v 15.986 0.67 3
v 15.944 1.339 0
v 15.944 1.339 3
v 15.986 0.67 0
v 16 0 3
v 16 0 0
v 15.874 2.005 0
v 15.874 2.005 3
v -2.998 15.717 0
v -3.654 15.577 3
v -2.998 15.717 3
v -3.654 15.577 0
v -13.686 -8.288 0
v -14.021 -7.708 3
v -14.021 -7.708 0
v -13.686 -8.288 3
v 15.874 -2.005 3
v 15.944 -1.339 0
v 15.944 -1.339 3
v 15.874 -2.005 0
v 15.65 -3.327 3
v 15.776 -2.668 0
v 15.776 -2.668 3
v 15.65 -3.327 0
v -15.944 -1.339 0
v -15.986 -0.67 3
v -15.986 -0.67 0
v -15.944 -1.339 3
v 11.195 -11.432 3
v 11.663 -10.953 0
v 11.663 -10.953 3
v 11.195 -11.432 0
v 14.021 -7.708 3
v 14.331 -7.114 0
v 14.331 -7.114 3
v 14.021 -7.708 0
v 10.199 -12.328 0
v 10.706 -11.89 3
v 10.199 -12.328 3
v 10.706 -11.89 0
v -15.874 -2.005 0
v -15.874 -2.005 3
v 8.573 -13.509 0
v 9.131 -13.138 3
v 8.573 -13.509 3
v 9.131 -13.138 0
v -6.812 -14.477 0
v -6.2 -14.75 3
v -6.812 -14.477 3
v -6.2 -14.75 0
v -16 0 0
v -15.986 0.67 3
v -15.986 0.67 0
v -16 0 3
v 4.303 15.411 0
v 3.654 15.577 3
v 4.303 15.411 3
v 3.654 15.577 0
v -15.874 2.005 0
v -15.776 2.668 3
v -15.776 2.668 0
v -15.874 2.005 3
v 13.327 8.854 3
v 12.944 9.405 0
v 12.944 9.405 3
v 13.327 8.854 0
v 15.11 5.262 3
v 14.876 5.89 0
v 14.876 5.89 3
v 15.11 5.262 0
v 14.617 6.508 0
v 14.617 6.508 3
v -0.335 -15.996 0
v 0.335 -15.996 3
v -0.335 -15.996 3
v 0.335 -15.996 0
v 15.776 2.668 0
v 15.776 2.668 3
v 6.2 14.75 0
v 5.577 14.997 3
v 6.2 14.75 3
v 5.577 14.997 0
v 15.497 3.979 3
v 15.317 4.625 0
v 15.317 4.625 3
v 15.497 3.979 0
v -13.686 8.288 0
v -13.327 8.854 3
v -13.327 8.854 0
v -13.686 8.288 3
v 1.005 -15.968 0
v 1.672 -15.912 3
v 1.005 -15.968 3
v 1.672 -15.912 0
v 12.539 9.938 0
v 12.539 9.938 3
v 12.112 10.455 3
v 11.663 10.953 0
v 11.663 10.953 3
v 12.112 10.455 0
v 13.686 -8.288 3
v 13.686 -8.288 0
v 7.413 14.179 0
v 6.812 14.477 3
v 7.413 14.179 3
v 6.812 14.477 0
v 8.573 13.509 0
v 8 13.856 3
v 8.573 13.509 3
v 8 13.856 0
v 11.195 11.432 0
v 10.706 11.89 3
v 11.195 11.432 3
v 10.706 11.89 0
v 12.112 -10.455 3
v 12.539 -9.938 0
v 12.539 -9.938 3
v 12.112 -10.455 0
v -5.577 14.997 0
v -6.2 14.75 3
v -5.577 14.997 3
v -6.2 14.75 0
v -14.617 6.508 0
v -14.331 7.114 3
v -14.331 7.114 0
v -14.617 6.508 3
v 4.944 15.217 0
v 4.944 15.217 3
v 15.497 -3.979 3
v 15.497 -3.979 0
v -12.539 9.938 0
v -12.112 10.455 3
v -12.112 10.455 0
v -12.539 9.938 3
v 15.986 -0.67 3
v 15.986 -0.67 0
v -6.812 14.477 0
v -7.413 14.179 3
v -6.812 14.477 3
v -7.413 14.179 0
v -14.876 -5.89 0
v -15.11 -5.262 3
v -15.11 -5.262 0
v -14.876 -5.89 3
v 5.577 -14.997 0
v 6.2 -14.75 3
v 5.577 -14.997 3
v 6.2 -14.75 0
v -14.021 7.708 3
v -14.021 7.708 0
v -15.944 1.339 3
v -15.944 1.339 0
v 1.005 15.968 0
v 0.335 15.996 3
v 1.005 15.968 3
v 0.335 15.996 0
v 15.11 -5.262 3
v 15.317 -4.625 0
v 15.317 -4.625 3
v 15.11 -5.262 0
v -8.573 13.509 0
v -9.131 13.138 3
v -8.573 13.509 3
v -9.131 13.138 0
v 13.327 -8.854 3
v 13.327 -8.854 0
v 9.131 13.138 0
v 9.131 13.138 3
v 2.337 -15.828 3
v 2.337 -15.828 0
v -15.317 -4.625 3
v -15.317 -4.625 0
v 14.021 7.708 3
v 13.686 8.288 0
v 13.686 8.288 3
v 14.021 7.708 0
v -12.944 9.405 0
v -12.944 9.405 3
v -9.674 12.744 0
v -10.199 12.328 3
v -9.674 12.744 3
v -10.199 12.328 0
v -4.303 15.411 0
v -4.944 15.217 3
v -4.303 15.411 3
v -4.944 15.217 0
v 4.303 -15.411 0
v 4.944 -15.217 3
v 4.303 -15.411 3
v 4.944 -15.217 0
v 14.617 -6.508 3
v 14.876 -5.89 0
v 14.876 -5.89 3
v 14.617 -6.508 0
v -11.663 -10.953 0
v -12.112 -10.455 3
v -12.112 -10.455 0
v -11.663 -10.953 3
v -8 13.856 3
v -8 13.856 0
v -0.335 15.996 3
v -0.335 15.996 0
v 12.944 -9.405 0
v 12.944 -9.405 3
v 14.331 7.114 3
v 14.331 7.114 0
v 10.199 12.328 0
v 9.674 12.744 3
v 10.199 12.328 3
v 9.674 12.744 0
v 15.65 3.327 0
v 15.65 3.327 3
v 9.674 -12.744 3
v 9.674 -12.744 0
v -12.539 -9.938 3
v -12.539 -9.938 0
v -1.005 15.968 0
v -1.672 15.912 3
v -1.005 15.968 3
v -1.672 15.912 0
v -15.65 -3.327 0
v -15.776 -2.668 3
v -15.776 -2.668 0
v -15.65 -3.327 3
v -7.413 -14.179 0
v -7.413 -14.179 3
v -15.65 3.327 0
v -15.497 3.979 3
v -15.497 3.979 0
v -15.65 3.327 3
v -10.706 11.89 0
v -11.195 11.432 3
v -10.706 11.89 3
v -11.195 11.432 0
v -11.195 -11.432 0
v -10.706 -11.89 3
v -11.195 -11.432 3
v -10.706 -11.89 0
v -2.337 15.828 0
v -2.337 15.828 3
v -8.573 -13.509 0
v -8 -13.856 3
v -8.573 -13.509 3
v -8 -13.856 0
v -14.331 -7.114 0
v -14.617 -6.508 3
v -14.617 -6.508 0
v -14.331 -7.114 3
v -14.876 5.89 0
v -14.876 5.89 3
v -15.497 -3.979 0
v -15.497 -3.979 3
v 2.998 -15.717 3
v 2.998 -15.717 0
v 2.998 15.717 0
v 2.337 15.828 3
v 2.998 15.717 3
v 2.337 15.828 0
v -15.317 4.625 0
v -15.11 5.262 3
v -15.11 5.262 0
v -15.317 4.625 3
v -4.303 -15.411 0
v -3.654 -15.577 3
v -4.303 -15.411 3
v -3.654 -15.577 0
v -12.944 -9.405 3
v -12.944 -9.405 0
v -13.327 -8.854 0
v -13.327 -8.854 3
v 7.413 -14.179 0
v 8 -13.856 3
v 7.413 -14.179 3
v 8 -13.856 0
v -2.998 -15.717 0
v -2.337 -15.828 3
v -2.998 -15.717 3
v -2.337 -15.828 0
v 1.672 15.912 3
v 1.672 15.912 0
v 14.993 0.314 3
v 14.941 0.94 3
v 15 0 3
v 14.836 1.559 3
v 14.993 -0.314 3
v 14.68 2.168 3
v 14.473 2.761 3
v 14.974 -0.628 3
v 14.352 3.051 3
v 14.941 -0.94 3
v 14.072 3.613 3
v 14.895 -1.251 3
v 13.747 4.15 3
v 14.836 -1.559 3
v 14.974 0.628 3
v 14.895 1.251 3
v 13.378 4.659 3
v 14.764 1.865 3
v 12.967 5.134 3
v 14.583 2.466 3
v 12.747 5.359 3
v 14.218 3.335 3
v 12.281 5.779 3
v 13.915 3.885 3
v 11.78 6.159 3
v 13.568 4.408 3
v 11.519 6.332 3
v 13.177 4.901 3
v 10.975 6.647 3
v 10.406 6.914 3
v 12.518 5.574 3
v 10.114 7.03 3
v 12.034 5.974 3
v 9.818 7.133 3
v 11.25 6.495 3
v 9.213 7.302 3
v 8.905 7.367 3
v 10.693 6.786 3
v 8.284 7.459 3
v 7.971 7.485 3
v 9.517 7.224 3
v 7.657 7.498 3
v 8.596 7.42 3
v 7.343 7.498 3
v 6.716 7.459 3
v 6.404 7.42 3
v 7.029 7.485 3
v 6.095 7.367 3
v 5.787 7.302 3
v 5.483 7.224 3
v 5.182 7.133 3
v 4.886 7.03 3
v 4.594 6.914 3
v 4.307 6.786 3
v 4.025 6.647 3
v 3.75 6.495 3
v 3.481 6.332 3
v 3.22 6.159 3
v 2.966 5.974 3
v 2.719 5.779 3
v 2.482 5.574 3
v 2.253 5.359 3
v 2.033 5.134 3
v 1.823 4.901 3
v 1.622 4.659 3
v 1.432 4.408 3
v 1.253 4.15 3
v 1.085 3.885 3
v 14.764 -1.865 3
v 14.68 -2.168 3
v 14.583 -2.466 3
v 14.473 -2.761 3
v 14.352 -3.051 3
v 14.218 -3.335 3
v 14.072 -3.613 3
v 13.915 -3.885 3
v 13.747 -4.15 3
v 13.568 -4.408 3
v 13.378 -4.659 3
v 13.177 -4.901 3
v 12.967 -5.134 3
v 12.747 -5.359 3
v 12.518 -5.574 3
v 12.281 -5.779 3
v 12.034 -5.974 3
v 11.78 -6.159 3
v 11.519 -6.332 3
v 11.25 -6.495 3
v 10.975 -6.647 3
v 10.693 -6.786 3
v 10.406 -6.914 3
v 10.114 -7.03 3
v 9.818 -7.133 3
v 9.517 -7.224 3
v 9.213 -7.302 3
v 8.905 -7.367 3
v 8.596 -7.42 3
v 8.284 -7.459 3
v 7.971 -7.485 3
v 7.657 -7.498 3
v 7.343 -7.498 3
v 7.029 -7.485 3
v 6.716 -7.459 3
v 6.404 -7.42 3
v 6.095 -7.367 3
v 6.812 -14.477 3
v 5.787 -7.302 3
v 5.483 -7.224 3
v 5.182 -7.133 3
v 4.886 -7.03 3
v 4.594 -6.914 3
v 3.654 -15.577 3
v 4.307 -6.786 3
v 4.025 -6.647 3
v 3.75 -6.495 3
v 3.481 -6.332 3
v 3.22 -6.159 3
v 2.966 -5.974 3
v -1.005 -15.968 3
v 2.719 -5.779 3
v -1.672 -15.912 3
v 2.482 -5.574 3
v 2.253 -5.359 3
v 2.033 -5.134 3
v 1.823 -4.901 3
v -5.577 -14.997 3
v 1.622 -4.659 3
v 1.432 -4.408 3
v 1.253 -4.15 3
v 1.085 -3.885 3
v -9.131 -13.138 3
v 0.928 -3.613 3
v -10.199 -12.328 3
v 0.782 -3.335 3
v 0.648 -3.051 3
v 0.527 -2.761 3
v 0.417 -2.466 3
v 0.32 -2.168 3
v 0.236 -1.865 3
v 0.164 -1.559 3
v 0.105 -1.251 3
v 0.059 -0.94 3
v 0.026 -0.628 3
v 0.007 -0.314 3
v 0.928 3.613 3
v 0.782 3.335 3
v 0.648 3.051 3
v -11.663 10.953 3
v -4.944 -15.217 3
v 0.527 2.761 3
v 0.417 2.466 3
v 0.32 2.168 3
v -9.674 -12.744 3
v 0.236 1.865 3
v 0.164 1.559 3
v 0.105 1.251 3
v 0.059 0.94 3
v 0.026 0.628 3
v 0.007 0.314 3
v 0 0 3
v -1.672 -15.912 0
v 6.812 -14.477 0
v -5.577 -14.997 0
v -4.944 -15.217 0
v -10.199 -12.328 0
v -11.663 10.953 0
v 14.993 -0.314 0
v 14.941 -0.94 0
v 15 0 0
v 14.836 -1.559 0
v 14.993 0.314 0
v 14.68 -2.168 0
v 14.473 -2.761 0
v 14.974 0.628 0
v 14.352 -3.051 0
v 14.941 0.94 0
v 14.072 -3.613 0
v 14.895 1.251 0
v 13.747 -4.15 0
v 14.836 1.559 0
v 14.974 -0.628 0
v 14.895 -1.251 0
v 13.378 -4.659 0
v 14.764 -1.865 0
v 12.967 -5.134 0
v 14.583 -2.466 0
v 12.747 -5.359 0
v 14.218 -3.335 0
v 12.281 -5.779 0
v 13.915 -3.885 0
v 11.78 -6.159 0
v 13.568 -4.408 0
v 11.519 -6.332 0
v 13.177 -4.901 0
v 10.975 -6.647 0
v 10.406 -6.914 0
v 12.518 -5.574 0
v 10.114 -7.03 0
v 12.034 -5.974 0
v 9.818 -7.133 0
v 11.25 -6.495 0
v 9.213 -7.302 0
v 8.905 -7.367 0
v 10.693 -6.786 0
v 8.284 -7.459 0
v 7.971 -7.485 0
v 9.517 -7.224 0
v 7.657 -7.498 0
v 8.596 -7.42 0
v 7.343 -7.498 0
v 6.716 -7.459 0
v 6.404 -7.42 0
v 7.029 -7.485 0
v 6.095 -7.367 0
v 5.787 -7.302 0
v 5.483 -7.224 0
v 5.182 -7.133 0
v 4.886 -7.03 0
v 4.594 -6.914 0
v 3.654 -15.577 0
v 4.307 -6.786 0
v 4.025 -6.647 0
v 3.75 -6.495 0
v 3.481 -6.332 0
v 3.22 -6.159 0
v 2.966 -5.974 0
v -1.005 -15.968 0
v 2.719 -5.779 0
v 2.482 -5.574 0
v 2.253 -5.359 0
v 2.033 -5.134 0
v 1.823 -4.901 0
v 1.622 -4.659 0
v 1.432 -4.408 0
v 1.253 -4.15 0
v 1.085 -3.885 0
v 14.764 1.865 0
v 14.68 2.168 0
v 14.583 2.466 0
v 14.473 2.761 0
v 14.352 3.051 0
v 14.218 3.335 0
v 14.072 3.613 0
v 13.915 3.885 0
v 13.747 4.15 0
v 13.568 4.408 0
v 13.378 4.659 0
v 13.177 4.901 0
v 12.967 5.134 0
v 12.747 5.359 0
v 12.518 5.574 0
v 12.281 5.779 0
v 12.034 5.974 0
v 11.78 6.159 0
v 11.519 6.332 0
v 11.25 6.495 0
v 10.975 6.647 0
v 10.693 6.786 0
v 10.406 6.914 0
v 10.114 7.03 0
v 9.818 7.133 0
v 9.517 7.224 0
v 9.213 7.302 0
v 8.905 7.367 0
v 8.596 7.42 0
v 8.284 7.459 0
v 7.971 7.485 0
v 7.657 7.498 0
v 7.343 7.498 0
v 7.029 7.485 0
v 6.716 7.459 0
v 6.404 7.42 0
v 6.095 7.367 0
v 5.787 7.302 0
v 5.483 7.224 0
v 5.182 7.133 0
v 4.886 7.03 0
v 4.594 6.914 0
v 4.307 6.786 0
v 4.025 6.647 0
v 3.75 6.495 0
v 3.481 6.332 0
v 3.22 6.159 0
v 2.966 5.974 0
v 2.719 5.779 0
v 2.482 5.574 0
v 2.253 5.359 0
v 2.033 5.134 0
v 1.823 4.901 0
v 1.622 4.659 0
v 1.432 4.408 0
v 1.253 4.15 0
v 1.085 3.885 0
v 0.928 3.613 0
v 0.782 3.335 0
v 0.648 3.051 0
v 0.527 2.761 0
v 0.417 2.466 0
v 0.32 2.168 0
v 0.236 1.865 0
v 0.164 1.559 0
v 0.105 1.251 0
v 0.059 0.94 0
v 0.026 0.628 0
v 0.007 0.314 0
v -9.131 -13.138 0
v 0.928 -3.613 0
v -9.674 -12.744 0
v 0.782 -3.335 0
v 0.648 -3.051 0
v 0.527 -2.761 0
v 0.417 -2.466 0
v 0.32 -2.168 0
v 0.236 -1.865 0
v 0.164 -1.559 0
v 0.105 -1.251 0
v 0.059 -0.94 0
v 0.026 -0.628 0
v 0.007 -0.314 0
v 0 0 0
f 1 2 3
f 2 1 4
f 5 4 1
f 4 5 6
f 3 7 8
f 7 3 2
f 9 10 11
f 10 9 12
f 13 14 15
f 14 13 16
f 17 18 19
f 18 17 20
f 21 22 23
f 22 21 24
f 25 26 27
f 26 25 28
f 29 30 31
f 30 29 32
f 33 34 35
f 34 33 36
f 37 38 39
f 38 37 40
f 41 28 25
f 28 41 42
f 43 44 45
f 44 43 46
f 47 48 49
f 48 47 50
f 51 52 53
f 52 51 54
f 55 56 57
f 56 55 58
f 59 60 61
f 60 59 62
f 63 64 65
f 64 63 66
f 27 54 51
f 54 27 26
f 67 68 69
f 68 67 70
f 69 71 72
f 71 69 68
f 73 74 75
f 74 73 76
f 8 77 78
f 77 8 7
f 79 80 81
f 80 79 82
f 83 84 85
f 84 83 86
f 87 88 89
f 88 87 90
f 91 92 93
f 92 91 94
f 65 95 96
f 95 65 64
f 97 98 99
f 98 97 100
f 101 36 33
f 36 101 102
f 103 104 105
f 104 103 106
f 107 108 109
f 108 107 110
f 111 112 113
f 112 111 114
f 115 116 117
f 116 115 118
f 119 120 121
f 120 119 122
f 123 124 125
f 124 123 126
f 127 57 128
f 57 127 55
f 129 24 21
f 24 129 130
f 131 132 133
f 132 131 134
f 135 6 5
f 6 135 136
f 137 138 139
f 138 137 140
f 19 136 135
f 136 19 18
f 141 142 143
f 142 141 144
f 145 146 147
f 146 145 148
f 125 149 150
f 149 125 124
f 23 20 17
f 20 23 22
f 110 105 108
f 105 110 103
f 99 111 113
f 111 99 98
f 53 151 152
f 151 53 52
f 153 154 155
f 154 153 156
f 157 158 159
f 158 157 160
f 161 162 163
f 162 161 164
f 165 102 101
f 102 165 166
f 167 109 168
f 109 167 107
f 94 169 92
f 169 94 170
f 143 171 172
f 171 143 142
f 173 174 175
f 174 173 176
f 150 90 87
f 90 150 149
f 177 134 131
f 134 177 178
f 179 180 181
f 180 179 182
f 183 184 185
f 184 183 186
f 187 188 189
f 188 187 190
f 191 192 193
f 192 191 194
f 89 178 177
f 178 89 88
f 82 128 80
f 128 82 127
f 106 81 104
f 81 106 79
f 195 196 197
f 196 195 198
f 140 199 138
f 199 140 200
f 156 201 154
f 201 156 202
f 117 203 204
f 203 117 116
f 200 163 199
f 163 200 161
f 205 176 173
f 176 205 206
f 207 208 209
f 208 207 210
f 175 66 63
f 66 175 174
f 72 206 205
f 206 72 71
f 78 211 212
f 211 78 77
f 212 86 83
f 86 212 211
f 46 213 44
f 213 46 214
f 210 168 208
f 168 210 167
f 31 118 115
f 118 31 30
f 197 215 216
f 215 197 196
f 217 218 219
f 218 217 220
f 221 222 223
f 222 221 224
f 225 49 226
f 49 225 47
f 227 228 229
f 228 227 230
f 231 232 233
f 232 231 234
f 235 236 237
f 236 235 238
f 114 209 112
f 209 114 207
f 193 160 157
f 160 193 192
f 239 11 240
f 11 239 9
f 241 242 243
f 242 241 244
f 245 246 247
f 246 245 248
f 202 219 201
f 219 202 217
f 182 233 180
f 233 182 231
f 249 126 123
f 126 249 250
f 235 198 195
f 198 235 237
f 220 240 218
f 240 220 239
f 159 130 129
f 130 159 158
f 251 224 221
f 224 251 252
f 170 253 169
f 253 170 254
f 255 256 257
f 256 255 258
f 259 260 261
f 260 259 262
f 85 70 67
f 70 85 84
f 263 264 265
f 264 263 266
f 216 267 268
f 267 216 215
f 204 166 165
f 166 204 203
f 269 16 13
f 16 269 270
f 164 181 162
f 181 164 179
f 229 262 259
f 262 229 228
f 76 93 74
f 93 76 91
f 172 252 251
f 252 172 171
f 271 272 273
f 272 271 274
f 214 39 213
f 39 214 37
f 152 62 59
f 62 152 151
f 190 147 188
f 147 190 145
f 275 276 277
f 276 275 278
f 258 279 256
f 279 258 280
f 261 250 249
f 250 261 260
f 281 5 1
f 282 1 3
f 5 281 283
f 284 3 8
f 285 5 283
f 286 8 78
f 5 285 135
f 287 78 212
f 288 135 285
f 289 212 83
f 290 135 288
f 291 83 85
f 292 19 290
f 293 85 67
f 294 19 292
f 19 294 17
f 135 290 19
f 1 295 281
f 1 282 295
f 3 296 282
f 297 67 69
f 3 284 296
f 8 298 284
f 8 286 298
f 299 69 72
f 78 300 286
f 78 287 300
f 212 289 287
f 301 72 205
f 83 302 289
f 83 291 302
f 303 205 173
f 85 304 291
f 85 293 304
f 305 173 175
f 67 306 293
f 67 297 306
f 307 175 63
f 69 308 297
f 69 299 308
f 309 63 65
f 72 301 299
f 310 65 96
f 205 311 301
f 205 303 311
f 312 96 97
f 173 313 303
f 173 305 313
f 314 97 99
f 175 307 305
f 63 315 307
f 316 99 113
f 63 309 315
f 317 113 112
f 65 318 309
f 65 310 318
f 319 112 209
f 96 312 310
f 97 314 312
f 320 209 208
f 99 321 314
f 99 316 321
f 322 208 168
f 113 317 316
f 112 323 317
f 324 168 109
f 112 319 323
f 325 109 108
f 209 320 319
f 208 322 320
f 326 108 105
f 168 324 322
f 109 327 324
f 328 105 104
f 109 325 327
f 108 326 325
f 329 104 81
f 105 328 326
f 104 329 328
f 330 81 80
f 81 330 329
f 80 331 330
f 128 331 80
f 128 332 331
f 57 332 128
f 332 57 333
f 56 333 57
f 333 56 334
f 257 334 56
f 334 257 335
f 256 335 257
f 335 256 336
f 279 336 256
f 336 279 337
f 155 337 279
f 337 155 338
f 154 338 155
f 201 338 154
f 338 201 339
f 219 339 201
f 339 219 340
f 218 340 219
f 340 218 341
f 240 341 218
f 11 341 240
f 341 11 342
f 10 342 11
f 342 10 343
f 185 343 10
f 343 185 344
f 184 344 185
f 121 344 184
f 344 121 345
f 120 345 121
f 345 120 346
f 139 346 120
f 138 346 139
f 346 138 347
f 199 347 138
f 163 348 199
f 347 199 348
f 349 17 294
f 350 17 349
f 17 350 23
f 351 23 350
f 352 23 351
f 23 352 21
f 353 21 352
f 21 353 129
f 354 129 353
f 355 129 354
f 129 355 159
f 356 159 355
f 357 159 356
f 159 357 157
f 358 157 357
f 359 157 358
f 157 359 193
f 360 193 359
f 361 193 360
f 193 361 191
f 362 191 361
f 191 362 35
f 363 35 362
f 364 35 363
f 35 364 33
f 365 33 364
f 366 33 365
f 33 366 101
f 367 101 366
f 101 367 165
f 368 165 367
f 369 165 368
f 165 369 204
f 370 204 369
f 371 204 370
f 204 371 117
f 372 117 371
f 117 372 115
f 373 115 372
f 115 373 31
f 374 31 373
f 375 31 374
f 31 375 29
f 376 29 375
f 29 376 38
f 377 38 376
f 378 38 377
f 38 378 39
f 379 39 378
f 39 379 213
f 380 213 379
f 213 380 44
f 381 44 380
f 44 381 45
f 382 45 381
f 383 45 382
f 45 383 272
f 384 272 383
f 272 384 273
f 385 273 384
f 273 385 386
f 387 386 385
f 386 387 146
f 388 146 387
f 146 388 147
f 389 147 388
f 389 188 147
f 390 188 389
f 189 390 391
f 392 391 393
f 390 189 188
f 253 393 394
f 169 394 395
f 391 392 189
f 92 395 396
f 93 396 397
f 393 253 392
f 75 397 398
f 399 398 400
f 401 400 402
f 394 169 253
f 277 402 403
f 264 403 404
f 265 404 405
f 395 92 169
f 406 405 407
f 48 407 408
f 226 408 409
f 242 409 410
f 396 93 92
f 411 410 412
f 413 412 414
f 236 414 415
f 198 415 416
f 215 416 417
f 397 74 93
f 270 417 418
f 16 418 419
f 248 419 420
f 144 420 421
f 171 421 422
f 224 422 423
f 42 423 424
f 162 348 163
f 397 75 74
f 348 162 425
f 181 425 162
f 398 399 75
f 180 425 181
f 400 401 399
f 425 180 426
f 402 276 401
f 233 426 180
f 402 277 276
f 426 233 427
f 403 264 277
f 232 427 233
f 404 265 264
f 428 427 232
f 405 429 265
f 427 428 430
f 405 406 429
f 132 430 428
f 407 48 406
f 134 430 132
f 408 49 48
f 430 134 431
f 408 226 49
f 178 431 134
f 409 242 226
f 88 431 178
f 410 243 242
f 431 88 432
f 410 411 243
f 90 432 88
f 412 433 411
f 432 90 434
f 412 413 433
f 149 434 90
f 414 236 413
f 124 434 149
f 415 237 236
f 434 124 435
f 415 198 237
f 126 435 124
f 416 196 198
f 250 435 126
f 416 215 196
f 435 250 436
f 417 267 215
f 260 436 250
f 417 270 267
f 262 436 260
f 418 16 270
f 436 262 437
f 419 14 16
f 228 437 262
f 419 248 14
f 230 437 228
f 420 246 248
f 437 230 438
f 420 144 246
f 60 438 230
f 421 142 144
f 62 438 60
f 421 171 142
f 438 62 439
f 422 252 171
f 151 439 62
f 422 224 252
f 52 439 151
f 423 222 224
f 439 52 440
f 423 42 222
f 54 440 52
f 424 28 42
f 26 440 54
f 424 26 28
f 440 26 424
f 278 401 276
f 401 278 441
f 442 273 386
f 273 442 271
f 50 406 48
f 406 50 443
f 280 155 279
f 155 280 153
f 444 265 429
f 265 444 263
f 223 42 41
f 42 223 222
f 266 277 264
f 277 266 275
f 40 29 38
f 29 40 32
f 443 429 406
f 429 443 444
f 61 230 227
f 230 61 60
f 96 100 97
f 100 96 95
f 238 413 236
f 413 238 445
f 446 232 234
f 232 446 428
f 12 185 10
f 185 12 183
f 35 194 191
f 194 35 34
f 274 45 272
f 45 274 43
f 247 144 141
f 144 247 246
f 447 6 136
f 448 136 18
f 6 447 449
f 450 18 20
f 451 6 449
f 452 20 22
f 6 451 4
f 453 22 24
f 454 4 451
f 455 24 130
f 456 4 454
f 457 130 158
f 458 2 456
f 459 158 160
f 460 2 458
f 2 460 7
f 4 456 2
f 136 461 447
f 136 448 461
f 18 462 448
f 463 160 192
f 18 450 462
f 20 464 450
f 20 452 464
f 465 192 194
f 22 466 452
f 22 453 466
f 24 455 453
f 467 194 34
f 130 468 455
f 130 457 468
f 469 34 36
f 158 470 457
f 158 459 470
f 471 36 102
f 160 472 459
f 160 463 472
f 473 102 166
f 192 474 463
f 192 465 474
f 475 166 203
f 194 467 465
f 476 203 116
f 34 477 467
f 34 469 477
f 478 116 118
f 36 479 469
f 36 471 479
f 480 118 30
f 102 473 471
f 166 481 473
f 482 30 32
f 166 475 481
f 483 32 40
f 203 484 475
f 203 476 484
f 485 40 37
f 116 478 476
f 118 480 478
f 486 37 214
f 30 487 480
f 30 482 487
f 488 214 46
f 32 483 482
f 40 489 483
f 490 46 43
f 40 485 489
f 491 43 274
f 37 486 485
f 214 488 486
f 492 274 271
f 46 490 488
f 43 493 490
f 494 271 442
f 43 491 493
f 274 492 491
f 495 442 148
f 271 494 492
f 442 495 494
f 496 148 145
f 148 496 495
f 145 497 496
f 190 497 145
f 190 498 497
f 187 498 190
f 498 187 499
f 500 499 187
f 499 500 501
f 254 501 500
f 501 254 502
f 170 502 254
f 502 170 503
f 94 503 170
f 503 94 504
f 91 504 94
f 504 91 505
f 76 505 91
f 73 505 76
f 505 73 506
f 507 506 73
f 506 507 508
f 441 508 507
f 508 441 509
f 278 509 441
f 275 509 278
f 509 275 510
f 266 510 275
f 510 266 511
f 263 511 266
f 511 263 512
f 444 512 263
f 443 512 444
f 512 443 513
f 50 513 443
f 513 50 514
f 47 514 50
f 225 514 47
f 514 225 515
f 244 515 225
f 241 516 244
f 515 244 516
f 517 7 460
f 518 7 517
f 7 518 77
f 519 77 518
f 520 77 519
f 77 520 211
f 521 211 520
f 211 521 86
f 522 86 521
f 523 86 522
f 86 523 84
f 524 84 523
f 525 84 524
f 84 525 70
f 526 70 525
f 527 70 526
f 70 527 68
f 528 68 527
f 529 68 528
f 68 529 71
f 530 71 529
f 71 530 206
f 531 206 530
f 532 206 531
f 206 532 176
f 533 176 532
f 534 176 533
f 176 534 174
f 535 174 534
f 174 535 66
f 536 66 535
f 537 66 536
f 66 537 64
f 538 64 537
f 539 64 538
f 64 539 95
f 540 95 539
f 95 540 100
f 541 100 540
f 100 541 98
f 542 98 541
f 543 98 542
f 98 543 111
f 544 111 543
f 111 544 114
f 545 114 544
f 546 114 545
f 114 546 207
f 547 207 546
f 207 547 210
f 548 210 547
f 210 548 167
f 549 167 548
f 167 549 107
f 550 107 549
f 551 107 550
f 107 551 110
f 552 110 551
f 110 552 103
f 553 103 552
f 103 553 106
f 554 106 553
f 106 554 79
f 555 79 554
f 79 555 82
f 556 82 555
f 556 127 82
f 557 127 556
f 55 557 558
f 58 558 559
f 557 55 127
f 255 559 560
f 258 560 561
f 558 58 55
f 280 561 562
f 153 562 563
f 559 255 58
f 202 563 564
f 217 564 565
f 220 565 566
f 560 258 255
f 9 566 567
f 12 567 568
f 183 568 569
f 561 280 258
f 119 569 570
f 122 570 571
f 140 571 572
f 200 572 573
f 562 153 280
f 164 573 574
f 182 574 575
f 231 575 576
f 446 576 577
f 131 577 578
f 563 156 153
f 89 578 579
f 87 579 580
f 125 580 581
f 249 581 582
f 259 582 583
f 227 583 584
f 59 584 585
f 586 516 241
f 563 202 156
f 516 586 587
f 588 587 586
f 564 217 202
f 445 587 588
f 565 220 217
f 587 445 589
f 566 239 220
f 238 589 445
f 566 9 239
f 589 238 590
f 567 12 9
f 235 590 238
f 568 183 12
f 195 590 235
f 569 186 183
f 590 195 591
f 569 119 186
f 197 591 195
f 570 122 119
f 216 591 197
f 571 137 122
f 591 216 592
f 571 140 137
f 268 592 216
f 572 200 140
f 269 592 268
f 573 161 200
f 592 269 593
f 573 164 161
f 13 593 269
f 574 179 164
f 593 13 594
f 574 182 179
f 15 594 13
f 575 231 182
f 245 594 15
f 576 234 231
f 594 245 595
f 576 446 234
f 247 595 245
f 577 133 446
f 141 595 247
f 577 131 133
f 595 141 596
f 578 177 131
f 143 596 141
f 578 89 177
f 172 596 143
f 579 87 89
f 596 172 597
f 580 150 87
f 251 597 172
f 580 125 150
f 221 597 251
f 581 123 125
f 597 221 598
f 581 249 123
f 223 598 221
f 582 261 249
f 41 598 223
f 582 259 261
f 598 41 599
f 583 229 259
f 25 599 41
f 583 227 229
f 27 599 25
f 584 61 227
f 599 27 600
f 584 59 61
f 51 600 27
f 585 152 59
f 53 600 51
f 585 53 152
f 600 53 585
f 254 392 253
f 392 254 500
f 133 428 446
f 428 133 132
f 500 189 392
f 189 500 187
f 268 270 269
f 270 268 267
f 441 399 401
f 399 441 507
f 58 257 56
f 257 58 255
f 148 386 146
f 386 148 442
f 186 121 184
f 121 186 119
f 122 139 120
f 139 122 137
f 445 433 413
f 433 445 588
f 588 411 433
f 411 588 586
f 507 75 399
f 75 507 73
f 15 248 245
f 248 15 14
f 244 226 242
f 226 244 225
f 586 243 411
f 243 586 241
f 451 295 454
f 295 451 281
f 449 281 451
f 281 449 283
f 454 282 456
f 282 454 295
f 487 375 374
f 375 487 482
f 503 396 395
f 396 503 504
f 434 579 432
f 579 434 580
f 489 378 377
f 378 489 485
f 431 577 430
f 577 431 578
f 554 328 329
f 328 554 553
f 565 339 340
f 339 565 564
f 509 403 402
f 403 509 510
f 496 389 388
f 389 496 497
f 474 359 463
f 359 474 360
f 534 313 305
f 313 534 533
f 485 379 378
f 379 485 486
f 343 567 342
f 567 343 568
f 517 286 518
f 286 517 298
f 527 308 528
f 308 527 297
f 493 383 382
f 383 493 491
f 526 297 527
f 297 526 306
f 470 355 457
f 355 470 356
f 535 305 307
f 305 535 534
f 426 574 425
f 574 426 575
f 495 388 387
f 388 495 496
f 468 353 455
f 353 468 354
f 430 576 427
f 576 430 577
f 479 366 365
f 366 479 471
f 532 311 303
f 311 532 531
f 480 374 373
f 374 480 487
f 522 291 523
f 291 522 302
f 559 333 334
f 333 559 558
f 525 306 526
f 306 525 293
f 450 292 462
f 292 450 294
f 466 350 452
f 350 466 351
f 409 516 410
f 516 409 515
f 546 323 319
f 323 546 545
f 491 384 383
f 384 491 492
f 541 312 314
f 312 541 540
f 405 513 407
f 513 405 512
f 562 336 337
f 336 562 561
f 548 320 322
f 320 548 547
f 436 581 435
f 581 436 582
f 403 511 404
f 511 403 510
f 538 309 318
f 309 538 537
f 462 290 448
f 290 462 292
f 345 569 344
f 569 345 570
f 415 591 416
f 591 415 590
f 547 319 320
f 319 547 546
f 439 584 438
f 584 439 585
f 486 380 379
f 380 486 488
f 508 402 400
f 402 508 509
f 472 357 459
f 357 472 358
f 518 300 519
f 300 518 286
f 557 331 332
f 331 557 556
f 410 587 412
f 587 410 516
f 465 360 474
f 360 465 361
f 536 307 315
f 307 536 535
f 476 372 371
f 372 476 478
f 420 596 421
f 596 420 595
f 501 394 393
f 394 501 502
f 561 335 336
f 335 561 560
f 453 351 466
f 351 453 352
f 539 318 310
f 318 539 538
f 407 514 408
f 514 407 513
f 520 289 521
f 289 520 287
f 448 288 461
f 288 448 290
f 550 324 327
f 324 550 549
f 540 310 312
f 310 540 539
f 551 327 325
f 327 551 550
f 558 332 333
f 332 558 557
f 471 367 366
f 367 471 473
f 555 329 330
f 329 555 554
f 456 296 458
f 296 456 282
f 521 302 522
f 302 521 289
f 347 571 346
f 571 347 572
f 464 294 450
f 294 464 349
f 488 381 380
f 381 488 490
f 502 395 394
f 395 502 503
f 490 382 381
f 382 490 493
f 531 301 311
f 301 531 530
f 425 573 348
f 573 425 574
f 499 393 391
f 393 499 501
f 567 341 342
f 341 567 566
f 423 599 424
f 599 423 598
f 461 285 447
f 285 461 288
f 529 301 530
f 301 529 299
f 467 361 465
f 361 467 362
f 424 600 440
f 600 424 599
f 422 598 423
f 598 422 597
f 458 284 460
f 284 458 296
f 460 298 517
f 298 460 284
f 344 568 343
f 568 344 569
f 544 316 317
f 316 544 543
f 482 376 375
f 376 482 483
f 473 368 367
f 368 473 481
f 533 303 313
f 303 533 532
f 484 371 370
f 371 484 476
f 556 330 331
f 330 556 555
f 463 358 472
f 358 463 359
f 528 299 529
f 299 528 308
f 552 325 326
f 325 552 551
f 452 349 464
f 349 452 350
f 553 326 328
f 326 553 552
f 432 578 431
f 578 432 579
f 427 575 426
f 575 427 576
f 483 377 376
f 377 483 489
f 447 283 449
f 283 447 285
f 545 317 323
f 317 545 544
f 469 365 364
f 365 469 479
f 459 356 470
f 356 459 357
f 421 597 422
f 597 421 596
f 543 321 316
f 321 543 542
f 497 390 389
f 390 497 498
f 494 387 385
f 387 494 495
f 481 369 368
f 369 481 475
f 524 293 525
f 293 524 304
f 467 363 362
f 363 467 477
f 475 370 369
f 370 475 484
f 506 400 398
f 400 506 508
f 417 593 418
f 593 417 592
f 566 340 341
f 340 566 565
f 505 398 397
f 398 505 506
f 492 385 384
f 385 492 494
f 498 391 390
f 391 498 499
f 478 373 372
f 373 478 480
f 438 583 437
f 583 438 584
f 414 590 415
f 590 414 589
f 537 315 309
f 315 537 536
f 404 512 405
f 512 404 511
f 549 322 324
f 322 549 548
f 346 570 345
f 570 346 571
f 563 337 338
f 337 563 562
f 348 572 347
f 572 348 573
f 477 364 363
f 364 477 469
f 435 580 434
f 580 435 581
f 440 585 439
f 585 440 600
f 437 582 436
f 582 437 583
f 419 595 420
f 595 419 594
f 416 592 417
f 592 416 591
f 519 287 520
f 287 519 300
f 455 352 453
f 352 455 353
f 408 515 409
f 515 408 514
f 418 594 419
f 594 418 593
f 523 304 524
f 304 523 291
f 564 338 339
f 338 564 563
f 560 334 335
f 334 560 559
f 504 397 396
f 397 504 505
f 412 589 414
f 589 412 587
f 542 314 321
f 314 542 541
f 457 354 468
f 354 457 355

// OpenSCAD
/* 
                            Dark Field Filters v1.0
                    
   Dark Field Filters v1.0

An open source filter for a costume dark field hat can be adapted to any compound microscope.

This 3D file is designed to be the first optical filter for contrast illumination Technics for microscopy enthusiast and professionals.
     
Source :https://github.com/Usuy-Leon/DIY_Dark-Field-Filters

This project is an Open Source project,
by Usuy D. Leon, 2025.03.26
Microscopist, National University of Colombia, Bogota DC,

    */

// // // // // // // // // // // // // // // // // // // // // // // // // //
/*                        - User Parameters -                             */
 
height = 3;         // Total height of the filter
outer_dia = 32;     // Outer diameter of the main structure
inner_dia = 15;     // Diameter of the light-blocking center cylinder
border_thickness = 2; // Thickness of the outer border
$fn = 150;          // Number of facets "resolution"

/*                      - Arms Characteristics -                          */

number_arms = 3;    // less arms will give you more information and light
arm_thickness = 1;  // Thickness of the connecting arms


// // // // // // // // // // // // // // // // // // // // // // // // // // 
/*                            - Filter Caracteristics -                    */

// Calculate the border ring
border_inner_dia = outer_dia - border_thickness;

// Create the outer border ring
difference() {
    cylinder(h=height, d=outer_dia);
    translate([7.5,0,0]) {cylinder(h=height, d=inner_dia);
    }  
}  
